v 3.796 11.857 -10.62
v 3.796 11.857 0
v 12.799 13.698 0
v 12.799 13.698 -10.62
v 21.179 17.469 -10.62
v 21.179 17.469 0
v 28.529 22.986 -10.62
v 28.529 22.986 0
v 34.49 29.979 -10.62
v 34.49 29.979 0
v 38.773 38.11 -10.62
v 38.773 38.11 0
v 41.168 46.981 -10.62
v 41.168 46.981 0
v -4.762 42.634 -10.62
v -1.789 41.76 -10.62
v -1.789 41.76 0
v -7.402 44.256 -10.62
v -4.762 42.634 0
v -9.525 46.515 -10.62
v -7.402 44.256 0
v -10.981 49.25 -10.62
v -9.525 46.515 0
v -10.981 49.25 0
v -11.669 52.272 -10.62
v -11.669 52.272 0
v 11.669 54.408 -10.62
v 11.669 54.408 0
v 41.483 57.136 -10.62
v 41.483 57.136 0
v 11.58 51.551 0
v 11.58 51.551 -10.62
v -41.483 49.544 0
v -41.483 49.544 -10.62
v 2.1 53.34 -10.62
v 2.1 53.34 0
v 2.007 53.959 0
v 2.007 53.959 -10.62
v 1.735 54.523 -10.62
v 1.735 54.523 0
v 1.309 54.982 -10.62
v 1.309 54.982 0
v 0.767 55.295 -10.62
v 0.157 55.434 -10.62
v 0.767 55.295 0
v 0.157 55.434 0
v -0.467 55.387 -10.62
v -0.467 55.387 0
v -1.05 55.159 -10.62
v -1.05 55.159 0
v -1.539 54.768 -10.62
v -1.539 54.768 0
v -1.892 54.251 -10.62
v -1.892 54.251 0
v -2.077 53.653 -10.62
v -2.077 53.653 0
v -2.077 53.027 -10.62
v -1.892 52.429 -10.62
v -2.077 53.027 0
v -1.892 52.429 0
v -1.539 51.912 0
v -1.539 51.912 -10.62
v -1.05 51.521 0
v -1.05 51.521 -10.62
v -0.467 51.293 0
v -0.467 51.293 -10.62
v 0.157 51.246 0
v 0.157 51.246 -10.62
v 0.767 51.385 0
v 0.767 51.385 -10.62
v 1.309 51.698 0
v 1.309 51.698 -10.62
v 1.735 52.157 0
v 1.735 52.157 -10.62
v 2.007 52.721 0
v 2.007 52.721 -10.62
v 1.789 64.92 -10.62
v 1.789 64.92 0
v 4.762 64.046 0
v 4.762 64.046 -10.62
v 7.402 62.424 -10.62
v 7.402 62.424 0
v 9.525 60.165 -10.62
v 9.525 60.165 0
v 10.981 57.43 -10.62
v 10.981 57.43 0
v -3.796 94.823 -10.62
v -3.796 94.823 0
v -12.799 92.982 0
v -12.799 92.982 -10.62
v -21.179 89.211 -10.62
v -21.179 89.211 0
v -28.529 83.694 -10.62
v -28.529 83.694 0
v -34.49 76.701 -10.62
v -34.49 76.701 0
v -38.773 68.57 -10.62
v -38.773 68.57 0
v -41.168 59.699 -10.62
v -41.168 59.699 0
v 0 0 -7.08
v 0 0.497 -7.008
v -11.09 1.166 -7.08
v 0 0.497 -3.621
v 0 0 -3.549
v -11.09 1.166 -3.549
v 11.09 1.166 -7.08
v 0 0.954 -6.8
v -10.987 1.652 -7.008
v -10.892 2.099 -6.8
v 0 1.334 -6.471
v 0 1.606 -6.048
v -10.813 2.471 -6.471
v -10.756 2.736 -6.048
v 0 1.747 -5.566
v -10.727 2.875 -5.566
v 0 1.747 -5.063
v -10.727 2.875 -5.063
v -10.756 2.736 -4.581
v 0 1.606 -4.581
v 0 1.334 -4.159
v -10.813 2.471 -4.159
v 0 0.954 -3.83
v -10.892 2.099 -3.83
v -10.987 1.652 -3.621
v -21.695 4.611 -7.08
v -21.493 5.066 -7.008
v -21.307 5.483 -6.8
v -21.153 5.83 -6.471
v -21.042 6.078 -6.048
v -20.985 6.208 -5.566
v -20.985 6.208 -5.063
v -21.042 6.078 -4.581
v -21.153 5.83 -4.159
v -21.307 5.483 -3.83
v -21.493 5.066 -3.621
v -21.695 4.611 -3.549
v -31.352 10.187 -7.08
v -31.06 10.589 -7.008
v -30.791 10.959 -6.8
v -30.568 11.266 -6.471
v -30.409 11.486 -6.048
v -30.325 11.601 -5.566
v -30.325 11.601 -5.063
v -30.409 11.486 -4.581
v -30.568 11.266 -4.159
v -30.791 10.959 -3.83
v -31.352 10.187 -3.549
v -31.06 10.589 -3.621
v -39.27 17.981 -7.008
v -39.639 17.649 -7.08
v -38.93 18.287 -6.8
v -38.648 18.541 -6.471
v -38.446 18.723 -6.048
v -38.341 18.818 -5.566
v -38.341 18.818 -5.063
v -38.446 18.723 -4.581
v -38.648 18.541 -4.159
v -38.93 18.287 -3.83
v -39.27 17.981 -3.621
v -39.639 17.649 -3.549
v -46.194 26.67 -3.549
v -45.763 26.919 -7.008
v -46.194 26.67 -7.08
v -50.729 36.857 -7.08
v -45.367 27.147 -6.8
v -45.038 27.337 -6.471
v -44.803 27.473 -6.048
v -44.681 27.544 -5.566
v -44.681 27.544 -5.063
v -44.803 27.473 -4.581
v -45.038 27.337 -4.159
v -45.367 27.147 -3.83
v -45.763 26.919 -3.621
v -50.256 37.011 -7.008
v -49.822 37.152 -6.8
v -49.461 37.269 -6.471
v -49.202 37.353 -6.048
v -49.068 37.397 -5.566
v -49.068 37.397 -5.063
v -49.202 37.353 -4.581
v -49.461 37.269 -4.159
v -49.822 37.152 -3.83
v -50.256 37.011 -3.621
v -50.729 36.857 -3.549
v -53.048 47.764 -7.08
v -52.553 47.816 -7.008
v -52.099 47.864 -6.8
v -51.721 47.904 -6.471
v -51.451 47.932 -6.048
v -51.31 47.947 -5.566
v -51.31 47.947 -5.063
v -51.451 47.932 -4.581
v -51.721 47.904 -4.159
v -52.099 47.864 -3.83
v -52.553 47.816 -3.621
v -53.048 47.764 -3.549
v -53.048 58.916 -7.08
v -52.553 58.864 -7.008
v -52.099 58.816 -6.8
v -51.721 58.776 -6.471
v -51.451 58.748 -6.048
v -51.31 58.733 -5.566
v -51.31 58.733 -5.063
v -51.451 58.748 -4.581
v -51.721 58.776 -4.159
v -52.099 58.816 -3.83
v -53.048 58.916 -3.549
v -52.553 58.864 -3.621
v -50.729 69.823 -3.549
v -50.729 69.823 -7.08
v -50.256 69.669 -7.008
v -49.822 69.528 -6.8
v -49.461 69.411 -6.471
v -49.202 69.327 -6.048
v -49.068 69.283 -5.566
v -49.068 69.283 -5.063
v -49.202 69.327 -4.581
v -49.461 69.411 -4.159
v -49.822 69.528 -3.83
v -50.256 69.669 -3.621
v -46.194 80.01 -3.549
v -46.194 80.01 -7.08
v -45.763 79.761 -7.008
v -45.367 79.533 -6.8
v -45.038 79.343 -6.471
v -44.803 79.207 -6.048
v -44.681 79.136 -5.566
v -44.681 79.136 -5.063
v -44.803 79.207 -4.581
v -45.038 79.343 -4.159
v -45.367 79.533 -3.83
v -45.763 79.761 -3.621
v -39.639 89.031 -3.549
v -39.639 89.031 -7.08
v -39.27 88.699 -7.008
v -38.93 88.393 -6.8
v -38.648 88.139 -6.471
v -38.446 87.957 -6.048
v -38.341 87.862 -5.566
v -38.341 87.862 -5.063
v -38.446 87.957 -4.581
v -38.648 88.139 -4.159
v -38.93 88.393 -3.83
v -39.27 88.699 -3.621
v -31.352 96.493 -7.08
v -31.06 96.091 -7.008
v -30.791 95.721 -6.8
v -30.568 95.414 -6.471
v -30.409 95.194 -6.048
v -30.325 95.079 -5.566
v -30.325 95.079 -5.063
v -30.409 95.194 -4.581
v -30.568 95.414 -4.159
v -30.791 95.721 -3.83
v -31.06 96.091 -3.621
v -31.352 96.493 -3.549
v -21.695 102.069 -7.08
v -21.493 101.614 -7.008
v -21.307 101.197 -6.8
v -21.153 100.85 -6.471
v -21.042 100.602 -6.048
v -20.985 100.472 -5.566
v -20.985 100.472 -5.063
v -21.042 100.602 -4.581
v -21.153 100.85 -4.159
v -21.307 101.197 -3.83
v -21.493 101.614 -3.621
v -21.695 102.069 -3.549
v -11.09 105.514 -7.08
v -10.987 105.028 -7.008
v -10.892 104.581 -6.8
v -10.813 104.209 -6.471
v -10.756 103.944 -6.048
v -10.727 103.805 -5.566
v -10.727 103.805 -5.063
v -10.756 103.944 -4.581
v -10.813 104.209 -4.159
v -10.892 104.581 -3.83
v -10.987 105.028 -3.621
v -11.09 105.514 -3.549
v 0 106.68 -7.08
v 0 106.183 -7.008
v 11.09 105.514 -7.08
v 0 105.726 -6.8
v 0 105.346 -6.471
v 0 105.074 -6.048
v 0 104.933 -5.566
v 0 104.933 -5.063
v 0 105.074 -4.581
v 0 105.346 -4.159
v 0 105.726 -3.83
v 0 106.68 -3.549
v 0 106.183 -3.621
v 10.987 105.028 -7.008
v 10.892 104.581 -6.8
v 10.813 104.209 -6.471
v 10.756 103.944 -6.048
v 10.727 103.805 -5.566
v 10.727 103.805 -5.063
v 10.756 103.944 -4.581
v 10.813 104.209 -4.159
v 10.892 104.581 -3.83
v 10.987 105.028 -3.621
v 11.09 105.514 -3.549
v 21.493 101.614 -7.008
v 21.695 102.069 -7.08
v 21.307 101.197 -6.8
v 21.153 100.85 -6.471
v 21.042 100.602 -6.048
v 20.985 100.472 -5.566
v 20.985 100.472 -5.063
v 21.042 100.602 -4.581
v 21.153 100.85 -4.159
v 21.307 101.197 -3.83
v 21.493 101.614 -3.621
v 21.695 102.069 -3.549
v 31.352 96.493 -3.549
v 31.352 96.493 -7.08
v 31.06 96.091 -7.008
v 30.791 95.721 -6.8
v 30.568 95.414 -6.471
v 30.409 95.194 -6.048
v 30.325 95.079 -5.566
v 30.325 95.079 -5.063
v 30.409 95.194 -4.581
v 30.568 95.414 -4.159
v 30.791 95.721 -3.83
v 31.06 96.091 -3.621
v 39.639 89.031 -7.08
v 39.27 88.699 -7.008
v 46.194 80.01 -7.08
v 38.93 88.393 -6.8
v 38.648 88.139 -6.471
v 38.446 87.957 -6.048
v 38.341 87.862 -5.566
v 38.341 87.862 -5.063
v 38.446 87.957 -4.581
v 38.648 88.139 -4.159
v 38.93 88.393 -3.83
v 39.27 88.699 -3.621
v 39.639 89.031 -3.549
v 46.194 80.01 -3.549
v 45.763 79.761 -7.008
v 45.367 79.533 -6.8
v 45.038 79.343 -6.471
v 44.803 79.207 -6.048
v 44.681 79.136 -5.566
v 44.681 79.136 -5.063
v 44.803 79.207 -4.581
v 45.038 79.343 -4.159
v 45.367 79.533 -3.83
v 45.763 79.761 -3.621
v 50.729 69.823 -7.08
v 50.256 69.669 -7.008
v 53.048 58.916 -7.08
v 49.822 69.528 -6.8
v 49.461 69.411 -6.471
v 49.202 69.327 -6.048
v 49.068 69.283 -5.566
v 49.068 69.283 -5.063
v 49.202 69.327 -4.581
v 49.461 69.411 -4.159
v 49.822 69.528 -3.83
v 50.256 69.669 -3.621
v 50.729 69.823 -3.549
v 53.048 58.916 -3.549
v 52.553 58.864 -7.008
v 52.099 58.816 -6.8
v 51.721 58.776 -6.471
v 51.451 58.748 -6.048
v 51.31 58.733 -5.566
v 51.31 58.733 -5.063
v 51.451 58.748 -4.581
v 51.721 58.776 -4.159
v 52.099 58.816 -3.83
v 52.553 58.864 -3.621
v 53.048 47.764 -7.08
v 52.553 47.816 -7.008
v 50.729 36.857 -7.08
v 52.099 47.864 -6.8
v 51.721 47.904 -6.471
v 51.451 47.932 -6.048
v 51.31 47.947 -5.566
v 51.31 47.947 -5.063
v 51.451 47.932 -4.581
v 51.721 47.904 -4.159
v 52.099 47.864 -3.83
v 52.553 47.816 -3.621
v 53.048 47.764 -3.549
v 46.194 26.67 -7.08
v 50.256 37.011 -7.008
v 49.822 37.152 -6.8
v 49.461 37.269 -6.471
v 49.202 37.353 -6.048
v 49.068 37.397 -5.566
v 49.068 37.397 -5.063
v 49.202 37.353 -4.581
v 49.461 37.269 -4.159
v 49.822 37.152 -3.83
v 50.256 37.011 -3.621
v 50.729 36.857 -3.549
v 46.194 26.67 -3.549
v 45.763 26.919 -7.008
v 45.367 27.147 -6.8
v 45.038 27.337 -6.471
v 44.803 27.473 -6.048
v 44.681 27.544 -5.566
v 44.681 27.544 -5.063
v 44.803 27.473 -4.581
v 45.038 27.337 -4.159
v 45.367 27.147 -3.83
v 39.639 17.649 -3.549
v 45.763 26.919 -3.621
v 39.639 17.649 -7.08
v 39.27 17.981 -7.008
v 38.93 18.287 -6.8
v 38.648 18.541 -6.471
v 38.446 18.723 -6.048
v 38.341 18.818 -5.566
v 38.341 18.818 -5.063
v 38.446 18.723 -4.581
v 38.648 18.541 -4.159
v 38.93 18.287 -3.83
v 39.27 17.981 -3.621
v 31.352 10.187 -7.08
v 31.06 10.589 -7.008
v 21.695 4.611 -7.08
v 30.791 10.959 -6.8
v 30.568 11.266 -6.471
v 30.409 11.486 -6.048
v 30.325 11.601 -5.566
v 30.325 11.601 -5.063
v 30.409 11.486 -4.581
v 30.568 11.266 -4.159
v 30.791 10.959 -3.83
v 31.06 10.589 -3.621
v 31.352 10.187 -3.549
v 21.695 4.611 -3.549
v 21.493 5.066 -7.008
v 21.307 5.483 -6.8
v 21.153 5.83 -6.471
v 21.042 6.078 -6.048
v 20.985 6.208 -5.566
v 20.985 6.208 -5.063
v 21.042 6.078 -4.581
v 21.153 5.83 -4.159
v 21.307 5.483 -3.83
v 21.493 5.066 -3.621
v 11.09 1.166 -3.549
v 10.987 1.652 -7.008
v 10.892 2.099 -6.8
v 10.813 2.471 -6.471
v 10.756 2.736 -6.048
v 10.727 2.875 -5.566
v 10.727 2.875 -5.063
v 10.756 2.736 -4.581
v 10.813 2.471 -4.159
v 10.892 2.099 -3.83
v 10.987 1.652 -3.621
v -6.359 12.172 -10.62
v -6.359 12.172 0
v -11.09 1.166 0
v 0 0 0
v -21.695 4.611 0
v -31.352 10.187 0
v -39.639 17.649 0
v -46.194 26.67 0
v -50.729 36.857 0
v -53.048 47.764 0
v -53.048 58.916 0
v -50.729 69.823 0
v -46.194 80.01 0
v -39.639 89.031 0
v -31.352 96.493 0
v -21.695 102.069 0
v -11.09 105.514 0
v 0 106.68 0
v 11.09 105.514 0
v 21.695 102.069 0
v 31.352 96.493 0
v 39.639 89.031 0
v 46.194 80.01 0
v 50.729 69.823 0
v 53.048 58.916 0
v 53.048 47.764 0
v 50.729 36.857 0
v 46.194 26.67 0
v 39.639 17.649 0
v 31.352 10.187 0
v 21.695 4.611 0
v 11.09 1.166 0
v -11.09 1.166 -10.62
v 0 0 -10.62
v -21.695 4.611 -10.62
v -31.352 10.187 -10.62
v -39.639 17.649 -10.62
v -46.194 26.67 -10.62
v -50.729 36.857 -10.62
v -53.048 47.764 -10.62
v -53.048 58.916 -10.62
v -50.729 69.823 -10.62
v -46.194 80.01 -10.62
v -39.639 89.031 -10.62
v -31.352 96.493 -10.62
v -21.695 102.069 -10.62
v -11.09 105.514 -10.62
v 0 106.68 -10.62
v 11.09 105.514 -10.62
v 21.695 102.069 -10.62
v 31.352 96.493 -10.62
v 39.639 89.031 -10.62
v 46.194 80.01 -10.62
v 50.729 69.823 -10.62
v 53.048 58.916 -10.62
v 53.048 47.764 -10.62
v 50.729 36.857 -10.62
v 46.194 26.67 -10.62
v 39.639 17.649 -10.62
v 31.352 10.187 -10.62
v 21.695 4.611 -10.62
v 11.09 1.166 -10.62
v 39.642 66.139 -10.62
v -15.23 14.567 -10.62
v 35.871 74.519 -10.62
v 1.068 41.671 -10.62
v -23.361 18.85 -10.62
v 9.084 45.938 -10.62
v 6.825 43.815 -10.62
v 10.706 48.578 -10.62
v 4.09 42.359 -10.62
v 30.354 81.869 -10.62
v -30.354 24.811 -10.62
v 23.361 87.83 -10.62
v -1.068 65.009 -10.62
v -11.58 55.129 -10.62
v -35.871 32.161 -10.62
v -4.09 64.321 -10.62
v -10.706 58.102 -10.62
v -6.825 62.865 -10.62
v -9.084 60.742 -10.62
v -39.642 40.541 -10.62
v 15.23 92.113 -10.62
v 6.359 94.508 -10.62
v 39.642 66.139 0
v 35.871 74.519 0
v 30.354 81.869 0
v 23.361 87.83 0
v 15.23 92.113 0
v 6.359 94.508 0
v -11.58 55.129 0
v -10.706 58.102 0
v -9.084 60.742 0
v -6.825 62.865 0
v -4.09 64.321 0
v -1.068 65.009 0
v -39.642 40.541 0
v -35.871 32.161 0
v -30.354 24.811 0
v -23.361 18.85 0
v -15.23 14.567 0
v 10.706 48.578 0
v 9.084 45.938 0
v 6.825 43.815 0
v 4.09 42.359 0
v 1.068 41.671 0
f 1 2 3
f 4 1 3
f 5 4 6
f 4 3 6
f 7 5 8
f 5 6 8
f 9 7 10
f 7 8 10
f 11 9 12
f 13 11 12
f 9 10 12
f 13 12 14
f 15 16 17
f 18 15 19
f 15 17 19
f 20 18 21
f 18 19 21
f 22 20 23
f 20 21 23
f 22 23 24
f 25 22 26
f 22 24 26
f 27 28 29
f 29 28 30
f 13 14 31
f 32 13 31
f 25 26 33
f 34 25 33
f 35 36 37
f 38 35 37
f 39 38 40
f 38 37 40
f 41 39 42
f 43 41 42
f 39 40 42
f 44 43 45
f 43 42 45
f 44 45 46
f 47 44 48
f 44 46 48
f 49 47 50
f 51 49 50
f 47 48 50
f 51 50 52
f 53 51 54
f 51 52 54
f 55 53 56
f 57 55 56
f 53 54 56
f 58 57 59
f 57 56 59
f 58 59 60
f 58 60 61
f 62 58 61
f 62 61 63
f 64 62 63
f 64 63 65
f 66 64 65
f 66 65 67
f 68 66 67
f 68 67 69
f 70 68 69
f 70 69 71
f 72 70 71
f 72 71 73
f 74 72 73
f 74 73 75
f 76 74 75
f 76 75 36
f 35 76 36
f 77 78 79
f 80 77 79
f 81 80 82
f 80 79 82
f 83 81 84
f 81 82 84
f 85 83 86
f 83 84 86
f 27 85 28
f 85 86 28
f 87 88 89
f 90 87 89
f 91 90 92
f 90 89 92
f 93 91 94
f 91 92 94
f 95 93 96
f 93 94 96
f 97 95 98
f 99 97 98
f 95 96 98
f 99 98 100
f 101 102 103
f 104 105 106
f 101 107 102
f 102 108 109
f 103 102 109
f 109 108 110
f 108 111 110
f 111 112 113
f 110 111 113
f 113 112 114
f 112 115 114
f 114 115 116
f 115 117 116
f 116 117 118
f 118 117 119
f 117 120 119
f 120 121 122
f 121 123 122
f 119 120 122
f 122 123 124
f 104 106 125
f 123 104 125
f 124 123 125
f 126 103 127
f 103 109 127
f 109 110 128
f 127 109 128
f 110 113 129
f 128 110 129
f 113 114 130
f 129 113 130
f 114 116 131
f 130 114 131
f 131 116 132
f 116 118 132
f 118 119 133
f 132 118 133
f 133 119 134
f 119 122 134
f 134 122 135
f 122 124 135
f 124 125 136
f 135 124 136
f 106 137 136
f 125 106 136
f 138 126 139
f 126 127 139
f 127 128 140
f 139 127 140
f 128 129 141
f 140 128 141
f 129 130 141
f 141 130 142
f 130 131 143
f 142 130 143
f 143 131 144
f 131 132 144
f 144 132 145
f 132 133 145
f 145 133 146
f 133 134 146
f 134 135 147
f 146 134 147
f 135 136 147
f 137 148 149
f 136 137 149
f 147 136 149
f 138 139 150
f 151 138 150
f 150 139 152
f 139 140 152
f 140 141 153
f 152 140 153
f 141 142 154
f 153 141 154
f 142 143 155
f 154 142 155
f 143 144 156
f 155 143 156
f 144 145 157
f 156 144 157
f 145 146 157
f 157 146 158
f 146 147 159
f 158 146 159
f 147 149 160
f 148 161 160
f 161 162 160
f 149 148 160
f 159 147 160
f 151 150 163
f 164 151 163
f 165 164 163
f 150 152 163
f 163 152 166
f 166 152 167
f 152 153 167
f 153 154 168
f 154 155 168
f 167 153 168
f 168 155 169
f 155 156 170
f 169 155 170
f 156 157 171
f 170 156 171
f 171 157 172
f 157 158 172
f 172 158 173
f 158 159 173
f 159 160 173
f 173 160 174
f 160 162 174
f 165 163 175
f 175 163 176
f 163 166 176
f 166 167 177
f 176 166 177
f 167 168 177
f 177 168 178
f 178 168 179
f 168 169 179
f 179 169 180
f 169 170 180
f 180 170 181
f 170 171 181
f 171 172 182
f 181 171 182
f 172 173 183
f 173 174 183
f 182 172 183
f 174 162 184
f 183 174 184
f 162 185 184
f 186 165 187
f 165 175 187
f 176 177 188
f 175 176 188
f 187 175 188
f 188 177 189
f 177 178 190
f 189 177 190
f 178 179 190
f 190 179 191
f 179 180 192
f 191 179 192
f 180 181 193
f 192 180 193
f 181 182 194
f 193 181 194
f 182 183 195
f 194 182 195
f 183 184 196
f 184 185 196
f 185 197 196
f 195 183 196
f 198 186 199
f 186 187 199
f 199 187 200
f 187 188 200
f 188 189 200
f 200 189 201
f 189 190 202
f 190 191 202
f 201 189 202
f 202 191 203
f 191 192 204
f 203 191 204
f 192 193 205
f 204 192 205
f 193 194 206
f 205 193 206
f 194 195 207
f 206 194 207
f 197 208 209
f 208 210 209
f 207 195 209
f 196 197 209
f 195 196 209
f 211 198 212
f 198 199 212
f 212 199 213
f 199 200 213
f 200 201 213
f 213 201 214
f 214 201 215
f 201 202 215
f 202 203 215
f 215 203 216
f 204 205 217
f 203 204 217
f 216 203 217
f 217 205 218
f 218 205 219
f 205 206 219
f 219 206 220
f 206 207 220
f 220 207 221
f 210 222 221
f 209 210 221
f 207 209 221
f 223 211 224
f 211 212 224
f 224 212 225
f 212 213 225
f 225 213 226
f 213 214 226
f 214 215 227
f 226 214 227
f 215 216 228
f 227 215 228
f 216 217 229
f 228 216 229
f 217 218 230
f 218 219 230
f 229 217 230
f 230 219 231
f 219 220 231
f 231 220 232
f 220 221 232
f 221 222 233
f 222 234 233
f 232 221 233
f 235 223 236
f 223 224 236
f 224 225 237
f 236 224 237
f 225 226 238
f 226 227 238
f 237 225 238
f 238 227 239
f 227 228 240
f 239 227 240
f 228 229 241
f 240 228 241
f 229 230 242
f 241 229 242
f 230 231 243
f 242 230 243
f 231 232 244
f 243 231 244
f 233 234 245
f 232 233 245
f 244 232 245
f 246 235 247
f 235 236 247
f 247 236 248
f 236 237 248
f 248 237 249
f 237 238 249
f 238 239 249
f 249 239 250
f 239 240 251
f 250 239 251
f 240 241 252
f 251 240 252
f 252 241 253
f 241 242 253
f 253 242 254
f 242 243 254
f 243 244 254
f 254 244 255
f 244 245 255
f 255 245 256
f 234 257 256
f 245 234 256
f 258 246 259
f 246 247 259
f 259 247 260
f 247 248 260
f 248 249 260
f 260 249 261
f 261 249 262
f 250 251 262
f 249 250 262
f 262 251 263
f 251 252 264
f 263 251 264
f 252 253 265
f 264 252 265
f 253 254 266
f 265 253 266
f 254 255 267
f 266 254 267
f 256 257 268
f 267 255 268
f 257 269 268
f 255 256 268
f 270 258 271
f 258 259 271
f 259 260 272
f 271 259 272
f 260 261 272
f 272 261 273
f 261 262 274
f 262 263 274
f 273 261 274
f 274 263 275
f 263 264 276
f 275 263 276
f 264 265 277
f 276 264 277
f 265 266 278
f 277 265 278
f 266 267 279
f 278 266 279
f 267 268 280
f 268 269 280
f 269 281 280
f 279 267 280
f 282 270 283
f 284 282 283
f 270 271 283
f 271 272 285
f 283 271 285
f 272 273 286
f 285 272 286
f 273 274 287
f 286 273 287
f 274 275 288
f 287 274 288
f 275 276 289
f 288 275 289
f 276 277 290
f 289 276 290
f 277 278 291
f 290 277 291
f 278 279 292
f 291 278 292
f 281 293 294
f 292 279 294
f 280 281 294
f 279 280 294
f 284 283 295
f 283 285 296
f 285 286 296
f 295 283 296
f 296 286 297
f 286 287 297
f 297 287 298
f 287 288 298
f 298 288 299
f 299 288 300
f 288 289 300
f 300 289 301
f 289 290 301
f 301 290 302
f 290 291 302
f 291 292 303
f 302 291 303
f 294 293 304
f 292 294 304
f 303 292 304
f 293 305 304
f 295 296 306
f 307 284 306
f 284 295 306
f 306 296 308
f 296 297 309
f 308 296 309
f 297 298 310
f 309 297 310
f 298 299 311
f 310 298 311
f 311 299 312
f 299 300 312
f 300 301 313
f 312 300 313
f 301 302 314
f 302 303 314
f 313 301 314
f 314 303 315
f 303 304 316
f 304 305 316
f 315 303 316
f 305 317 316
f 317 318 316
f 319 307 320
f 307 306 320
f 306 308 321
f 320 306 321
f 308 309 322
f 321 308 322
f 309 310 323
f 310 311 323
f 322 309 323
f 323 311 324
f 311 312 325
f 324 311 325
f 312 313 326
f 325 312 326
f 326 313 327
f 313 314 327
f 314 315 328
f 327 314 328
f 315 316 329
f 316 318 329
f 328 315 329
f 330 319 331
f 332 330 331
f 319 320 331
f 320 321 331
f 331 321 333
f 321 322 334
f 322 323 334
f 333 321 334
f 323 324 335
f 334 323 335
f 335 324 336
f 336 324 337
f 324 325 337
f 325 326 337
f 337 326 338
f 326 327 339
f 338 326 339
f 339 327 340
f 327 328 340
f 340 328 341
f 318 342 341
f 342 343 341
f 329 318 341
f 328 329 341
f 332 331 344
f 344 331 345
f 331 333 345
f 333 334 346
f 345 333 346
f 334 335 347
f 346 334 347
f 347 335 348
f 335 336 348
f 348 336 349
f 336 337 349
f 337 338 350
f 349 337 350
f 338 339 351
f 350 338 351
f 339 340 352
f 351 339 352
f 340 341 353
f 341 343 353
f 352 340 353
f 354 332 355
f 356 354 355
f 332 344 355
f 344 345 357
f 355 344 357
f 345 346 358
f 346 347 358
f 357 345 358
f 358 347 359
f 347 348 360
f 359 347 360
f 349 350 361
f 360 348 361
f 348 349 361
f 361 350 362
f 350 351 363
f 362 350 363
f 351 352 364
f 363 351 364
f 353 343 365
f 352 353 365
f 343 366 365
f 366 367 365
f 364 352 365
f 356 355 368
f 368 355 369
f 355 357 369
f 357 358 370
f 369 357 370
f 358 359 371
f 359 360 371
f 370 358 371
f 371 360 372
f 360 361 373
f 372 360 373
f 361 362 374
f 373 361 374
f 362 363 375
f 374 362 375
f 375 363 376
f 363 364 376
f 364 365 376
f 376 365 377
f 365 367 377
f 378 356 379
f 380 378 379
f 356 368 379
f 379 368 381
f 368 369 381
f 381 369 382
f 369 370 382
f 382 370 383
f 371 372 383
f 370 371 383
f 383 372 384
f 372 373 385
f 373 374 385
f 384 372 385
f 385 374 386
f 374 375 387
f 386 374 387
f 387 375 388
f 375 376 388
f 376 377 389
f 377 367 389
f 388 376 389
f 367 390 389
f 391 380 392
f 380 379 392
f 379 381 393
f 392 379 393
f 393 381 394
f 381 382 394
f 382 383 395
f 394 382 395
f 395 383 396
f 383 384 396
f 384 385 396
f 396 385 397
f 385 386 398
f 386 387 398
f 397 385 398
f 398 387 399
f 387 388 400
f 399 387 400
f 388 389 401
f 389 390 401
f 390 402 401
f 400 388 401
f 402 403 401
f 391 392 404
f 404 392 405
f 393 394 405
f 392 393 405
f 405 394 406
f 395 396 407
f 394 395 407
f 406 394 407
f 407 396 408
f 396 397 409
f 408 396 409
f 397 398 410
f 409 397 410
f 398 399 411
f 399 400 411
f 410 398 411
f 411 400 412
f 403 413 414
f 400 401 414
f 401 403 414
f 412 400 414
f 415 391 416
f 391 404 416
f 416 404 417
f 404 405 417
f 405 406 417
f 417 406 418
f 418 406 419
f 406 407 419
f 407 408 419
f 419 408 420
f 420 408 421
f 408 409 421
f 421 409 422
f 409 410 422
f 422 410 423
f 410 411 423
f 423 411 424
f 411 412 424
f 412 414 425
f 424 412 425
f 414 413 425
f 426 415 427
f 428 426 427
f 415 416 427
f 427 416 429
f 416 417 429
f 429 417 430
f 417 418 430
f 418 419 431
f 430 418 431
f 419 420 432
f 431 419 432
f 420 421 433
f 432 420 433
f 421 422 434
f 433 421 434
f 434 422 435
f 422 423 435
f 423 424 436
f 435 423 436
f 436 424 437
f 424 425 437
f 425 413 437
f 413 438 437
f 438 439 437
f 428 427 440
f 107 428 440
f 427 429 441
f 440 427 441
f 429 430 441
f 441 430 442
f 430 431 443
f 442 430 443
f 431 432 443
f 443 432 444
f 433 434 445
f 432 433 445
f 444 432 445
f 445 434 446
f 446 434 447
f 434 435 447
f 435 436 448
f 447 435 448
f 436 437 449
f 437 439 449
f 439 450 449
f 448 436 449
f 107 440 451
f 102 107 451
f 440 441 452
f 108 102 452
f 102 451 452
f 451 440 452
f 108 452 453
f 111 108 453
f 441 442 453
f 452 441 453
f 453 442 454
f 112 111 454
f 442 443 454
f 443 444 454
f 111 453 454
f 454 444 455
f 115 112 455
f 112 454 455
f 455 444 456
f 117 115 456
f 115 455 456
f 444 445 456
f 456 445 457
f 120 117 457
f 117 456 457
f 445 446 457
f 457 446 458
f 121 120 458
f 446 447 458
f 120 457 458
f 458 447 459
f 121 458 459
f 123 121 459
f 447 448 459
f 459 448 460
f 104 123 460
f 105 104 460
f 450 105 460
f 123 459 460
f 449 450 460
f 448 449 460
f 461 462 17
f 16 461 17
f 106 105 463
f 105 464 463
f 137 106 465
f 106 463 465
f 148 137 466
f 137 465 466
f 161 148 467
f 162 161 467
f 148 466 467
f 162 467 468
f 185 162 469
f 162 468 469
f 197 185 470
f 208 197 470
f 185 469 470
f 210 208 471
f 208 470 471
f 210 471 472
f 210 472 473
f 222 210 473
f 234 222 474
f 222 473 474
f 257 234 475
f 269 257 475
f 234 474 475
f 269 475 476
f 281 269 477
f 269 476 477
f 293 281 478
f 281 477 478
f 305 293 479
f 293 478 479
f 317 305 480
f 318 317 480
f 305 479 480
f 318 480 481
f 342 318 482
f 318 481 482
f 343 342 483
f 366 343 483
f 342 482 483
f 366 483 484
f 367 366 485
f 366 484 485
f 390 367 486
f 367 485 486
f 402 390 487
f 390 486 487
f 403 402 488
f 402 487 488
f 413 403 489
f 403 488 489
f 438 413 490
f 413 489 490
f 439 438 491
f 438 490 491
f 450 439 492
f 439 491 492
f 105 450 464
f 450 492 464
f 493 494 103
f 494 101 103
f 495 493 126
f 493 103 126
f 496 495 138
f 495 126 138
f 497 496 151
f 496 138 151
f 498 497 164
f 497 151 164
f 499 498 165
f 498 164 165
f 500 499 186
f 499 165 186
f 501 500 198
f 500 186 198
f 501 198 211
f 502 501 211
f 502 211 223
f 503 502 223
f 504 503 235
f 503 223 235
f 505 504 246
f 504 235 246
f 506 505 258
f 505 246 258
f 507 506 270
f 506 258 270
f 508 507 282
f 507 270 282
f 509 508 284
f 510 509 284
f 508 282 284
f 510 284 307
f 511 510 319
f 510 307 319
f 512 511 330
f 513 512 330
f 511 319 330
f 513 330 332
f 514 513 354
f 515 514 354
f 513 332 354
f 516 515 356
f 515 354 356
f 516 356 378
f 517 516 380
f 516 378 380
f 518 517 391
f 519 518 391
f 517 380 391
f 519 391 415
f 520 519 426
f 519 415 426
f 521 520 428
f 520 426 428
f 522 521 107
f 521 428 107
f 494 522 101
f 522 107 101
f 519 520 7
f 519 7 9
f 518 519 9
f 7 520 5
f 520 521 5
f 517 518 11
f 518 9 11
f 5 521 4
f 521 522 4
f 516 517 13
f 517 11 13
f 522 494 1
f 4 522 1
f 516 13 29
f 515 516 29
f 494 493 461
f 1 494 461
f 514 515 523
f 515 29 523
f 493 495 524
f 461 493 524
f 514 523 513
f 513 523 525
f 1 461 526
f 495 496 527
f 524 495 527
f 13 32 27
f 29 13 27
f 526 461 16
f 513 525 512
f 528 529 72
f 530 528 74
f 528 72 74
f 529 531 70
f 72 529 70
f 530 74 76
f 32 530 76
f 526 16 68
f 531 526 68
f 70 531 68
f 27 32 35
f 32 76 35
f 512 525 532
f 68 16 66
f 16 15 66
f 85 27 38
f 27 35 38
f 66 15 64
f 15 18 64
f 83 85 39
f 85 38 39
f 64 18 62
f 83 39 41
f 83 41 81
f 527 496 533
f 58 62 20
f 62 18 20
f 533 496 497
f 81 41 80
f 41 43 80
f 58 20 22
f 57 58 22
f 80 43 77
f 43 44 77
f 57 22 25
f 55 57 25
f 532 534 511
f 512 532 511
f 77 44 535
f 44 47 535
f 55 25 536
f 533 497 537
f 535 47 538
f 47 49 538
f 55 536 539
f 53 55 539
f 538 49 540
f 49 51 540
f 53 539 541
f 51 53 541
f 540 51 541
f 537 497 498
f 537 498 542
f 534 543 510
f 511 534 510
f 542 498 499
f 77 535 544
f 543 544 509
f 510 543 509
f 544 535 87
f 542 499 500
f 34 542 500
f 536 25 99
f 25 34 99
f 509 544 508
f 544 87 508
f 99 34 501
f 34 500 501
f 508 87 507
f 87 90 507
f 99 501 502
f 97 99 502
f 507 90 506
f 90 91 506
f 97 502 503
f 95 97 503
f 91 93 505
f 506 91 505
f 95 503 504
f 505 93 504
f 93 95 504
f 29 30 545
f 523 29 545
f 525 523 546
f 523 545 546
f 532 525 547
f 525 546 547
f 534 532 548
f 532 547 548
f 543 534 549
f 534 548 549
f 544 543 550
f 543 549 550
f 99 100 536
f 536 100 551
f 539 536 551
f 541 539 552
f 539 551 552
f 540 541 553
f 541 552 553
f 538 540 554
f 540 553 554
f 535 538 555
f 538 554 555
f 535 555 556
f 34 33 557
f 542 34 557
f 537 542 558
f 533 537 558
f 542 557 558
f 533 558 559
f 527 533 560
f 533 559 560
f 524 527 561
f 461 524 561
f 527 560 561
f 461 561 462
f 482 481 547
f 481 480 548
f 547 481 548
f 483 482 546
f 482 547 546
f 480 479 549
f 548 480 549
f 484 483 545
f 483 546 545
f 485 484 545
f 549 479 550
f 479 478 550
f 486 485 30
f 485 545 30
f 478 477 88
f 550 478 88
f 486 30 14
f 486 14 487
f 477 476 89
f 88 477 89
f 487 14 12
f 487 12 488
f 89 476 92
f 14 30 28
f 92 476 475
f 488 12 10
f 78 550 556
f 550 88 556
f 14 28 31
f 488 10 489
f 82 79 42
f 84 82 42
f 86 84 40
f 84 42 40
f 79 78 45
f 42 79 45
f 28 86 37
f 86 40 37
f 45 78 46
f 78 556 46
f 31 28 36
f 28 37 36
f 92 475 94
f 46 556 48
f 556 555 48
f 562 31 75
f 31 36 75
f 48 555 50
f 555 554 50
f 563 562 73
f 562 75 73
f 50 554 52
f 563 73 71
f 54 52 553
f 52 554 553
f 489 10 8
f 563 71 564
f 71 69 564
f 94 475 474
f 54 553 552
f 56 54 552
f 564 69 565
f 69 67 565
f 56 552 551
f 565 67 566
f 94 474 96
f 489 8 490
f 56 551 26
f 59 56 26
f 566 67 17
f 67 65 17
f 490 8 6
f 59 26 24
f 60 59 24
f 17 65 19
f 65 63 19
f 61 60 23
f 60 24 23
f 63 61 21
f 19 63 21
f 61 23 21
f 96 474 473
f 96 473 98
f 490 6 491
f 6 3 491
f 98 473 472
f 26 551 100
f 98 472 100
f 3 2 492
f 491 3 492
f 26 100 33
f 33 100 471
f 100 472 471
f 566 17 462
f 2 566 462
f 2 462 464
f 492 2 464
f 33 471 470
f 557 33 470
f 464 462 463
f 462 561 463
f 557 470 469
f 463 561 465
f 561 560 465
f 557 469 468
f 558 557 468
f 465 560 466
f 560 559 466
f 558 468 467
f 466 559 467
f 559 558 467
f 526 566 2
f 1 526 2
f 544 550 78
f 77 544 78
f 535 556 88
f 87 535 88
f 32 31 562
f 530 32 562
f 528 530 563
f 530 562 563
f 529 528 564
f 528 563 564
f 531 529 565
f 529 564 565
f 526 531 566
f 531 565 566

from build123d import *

# Parameters (mm, degrees)
SKETCH5_R          = 2.1
CUT_EXTRUDE1_DEPTH = 120.743736371
CUT_EXTRUDE2_DEPTH = 120.743736371


with BuildPart() as part:
    # Sketch3 → Revolve1 (revolve)
    with BuildSketch(Plane(origin=(0, 0, 0), x_dir=(0, 0, -1), z_dir=(1, 0, 0))):
        with BuildLine():
            Line((0, 0), (0, 53.34))
            Line((0, 53.34), (10.62, 53.34))
            Line((10.62, 53.34), (10.62, 0))
            Line((10.62, 0), (7.08, 0))
            ThreePointArc((7.08, 0), (5.3147, 1.7653), (3.5494, 0))
            Line((3.5494, 0), (0, 0))
        make_face()
    revolve(axis=Axis((0, 53.34, 0), (0, 0, -1)))

    # Sketch5 → Cut-Extrude1 (cut, through all)
    with BuildSketch(Plane.XY):
        with Locations((0, 53.34)):
            Circle(SKETCH5_R)
    extrude(amount=-CUT_EXTRUDE1_DEPTH, mode=Mode.SUBTRACT)

    # Sketch6 → Cut-Extrude2 (cut, through all)
    with BuildSketch(Plane.XY):
        with BuildLine():
            Line((6.358903838, 94.508420539), (1.788715657, 64.920391883))
            ThreePointArc((1.788715657, 64.920391883), (8.538481175, 61.364918635), (11.668962152, 54.407849322))
            Line((11.668962152, 54.407849322), (41.483288818, 57.136216085))
            ThreePointArc((41.483288818, 57.136216085), (30.354394508, 81.868674027), (6.358903838, 94.508420539))
        make_face()
        with BuildLine():
            Line((41.168420539, 46.981096162), (11.580391883, 51.551284343))
            ThreePointArc((11.580391883, 51.551284343), (8.024918635, 44.801518825), (1.067849322, 41.671037848))
            Line((1.067849322, 41.671037848), (3.796216085, 11.856711182))
            ThreePointArc((3.796216085, 11.856711182), (28.528674027, 22.985605492), (41.168420539, 46.981096162))
        make_face()
        with BuildLine():
            Line((-6.358903838, 12.171579461), (-1.788715657, 41.759608117))
            ThreePointArc((-1.788715657, 41.759608117), (-8.538481175, 45.315081365), (-11.668962152, 52.272150678))
            Line((-11.668962152, 52.272150678), (-41.483288818, 49.543783915))
            ThreePointArc((-41.483288818, 49.543783915), (-30.354394508, 24.811325973), (-6.358903838, 12.171579461))
        make_face()
        with BuildLine():
            Line((-41.168420539, 59.698903838), (-11.580391883, 55.128715657))
            ThreePointArc((-11.580391883, 55.128715657), (-8.024918635, 61.878481175), (-1.067849322, 65.008962152))
            Line((-1.067849322, 65.008962152), (-3.796216085, 94.823288818))
            ThreePointArc((-3.796216085, 94.823288818), (-28.528674027, 83.694394508), (-41.168420539, 59.698903838))
        make_face()
    extrude(amount=-CUT_EXTRUDE2_DEPTH, mode=Mode.SUBTRACT)


solid = part.part
